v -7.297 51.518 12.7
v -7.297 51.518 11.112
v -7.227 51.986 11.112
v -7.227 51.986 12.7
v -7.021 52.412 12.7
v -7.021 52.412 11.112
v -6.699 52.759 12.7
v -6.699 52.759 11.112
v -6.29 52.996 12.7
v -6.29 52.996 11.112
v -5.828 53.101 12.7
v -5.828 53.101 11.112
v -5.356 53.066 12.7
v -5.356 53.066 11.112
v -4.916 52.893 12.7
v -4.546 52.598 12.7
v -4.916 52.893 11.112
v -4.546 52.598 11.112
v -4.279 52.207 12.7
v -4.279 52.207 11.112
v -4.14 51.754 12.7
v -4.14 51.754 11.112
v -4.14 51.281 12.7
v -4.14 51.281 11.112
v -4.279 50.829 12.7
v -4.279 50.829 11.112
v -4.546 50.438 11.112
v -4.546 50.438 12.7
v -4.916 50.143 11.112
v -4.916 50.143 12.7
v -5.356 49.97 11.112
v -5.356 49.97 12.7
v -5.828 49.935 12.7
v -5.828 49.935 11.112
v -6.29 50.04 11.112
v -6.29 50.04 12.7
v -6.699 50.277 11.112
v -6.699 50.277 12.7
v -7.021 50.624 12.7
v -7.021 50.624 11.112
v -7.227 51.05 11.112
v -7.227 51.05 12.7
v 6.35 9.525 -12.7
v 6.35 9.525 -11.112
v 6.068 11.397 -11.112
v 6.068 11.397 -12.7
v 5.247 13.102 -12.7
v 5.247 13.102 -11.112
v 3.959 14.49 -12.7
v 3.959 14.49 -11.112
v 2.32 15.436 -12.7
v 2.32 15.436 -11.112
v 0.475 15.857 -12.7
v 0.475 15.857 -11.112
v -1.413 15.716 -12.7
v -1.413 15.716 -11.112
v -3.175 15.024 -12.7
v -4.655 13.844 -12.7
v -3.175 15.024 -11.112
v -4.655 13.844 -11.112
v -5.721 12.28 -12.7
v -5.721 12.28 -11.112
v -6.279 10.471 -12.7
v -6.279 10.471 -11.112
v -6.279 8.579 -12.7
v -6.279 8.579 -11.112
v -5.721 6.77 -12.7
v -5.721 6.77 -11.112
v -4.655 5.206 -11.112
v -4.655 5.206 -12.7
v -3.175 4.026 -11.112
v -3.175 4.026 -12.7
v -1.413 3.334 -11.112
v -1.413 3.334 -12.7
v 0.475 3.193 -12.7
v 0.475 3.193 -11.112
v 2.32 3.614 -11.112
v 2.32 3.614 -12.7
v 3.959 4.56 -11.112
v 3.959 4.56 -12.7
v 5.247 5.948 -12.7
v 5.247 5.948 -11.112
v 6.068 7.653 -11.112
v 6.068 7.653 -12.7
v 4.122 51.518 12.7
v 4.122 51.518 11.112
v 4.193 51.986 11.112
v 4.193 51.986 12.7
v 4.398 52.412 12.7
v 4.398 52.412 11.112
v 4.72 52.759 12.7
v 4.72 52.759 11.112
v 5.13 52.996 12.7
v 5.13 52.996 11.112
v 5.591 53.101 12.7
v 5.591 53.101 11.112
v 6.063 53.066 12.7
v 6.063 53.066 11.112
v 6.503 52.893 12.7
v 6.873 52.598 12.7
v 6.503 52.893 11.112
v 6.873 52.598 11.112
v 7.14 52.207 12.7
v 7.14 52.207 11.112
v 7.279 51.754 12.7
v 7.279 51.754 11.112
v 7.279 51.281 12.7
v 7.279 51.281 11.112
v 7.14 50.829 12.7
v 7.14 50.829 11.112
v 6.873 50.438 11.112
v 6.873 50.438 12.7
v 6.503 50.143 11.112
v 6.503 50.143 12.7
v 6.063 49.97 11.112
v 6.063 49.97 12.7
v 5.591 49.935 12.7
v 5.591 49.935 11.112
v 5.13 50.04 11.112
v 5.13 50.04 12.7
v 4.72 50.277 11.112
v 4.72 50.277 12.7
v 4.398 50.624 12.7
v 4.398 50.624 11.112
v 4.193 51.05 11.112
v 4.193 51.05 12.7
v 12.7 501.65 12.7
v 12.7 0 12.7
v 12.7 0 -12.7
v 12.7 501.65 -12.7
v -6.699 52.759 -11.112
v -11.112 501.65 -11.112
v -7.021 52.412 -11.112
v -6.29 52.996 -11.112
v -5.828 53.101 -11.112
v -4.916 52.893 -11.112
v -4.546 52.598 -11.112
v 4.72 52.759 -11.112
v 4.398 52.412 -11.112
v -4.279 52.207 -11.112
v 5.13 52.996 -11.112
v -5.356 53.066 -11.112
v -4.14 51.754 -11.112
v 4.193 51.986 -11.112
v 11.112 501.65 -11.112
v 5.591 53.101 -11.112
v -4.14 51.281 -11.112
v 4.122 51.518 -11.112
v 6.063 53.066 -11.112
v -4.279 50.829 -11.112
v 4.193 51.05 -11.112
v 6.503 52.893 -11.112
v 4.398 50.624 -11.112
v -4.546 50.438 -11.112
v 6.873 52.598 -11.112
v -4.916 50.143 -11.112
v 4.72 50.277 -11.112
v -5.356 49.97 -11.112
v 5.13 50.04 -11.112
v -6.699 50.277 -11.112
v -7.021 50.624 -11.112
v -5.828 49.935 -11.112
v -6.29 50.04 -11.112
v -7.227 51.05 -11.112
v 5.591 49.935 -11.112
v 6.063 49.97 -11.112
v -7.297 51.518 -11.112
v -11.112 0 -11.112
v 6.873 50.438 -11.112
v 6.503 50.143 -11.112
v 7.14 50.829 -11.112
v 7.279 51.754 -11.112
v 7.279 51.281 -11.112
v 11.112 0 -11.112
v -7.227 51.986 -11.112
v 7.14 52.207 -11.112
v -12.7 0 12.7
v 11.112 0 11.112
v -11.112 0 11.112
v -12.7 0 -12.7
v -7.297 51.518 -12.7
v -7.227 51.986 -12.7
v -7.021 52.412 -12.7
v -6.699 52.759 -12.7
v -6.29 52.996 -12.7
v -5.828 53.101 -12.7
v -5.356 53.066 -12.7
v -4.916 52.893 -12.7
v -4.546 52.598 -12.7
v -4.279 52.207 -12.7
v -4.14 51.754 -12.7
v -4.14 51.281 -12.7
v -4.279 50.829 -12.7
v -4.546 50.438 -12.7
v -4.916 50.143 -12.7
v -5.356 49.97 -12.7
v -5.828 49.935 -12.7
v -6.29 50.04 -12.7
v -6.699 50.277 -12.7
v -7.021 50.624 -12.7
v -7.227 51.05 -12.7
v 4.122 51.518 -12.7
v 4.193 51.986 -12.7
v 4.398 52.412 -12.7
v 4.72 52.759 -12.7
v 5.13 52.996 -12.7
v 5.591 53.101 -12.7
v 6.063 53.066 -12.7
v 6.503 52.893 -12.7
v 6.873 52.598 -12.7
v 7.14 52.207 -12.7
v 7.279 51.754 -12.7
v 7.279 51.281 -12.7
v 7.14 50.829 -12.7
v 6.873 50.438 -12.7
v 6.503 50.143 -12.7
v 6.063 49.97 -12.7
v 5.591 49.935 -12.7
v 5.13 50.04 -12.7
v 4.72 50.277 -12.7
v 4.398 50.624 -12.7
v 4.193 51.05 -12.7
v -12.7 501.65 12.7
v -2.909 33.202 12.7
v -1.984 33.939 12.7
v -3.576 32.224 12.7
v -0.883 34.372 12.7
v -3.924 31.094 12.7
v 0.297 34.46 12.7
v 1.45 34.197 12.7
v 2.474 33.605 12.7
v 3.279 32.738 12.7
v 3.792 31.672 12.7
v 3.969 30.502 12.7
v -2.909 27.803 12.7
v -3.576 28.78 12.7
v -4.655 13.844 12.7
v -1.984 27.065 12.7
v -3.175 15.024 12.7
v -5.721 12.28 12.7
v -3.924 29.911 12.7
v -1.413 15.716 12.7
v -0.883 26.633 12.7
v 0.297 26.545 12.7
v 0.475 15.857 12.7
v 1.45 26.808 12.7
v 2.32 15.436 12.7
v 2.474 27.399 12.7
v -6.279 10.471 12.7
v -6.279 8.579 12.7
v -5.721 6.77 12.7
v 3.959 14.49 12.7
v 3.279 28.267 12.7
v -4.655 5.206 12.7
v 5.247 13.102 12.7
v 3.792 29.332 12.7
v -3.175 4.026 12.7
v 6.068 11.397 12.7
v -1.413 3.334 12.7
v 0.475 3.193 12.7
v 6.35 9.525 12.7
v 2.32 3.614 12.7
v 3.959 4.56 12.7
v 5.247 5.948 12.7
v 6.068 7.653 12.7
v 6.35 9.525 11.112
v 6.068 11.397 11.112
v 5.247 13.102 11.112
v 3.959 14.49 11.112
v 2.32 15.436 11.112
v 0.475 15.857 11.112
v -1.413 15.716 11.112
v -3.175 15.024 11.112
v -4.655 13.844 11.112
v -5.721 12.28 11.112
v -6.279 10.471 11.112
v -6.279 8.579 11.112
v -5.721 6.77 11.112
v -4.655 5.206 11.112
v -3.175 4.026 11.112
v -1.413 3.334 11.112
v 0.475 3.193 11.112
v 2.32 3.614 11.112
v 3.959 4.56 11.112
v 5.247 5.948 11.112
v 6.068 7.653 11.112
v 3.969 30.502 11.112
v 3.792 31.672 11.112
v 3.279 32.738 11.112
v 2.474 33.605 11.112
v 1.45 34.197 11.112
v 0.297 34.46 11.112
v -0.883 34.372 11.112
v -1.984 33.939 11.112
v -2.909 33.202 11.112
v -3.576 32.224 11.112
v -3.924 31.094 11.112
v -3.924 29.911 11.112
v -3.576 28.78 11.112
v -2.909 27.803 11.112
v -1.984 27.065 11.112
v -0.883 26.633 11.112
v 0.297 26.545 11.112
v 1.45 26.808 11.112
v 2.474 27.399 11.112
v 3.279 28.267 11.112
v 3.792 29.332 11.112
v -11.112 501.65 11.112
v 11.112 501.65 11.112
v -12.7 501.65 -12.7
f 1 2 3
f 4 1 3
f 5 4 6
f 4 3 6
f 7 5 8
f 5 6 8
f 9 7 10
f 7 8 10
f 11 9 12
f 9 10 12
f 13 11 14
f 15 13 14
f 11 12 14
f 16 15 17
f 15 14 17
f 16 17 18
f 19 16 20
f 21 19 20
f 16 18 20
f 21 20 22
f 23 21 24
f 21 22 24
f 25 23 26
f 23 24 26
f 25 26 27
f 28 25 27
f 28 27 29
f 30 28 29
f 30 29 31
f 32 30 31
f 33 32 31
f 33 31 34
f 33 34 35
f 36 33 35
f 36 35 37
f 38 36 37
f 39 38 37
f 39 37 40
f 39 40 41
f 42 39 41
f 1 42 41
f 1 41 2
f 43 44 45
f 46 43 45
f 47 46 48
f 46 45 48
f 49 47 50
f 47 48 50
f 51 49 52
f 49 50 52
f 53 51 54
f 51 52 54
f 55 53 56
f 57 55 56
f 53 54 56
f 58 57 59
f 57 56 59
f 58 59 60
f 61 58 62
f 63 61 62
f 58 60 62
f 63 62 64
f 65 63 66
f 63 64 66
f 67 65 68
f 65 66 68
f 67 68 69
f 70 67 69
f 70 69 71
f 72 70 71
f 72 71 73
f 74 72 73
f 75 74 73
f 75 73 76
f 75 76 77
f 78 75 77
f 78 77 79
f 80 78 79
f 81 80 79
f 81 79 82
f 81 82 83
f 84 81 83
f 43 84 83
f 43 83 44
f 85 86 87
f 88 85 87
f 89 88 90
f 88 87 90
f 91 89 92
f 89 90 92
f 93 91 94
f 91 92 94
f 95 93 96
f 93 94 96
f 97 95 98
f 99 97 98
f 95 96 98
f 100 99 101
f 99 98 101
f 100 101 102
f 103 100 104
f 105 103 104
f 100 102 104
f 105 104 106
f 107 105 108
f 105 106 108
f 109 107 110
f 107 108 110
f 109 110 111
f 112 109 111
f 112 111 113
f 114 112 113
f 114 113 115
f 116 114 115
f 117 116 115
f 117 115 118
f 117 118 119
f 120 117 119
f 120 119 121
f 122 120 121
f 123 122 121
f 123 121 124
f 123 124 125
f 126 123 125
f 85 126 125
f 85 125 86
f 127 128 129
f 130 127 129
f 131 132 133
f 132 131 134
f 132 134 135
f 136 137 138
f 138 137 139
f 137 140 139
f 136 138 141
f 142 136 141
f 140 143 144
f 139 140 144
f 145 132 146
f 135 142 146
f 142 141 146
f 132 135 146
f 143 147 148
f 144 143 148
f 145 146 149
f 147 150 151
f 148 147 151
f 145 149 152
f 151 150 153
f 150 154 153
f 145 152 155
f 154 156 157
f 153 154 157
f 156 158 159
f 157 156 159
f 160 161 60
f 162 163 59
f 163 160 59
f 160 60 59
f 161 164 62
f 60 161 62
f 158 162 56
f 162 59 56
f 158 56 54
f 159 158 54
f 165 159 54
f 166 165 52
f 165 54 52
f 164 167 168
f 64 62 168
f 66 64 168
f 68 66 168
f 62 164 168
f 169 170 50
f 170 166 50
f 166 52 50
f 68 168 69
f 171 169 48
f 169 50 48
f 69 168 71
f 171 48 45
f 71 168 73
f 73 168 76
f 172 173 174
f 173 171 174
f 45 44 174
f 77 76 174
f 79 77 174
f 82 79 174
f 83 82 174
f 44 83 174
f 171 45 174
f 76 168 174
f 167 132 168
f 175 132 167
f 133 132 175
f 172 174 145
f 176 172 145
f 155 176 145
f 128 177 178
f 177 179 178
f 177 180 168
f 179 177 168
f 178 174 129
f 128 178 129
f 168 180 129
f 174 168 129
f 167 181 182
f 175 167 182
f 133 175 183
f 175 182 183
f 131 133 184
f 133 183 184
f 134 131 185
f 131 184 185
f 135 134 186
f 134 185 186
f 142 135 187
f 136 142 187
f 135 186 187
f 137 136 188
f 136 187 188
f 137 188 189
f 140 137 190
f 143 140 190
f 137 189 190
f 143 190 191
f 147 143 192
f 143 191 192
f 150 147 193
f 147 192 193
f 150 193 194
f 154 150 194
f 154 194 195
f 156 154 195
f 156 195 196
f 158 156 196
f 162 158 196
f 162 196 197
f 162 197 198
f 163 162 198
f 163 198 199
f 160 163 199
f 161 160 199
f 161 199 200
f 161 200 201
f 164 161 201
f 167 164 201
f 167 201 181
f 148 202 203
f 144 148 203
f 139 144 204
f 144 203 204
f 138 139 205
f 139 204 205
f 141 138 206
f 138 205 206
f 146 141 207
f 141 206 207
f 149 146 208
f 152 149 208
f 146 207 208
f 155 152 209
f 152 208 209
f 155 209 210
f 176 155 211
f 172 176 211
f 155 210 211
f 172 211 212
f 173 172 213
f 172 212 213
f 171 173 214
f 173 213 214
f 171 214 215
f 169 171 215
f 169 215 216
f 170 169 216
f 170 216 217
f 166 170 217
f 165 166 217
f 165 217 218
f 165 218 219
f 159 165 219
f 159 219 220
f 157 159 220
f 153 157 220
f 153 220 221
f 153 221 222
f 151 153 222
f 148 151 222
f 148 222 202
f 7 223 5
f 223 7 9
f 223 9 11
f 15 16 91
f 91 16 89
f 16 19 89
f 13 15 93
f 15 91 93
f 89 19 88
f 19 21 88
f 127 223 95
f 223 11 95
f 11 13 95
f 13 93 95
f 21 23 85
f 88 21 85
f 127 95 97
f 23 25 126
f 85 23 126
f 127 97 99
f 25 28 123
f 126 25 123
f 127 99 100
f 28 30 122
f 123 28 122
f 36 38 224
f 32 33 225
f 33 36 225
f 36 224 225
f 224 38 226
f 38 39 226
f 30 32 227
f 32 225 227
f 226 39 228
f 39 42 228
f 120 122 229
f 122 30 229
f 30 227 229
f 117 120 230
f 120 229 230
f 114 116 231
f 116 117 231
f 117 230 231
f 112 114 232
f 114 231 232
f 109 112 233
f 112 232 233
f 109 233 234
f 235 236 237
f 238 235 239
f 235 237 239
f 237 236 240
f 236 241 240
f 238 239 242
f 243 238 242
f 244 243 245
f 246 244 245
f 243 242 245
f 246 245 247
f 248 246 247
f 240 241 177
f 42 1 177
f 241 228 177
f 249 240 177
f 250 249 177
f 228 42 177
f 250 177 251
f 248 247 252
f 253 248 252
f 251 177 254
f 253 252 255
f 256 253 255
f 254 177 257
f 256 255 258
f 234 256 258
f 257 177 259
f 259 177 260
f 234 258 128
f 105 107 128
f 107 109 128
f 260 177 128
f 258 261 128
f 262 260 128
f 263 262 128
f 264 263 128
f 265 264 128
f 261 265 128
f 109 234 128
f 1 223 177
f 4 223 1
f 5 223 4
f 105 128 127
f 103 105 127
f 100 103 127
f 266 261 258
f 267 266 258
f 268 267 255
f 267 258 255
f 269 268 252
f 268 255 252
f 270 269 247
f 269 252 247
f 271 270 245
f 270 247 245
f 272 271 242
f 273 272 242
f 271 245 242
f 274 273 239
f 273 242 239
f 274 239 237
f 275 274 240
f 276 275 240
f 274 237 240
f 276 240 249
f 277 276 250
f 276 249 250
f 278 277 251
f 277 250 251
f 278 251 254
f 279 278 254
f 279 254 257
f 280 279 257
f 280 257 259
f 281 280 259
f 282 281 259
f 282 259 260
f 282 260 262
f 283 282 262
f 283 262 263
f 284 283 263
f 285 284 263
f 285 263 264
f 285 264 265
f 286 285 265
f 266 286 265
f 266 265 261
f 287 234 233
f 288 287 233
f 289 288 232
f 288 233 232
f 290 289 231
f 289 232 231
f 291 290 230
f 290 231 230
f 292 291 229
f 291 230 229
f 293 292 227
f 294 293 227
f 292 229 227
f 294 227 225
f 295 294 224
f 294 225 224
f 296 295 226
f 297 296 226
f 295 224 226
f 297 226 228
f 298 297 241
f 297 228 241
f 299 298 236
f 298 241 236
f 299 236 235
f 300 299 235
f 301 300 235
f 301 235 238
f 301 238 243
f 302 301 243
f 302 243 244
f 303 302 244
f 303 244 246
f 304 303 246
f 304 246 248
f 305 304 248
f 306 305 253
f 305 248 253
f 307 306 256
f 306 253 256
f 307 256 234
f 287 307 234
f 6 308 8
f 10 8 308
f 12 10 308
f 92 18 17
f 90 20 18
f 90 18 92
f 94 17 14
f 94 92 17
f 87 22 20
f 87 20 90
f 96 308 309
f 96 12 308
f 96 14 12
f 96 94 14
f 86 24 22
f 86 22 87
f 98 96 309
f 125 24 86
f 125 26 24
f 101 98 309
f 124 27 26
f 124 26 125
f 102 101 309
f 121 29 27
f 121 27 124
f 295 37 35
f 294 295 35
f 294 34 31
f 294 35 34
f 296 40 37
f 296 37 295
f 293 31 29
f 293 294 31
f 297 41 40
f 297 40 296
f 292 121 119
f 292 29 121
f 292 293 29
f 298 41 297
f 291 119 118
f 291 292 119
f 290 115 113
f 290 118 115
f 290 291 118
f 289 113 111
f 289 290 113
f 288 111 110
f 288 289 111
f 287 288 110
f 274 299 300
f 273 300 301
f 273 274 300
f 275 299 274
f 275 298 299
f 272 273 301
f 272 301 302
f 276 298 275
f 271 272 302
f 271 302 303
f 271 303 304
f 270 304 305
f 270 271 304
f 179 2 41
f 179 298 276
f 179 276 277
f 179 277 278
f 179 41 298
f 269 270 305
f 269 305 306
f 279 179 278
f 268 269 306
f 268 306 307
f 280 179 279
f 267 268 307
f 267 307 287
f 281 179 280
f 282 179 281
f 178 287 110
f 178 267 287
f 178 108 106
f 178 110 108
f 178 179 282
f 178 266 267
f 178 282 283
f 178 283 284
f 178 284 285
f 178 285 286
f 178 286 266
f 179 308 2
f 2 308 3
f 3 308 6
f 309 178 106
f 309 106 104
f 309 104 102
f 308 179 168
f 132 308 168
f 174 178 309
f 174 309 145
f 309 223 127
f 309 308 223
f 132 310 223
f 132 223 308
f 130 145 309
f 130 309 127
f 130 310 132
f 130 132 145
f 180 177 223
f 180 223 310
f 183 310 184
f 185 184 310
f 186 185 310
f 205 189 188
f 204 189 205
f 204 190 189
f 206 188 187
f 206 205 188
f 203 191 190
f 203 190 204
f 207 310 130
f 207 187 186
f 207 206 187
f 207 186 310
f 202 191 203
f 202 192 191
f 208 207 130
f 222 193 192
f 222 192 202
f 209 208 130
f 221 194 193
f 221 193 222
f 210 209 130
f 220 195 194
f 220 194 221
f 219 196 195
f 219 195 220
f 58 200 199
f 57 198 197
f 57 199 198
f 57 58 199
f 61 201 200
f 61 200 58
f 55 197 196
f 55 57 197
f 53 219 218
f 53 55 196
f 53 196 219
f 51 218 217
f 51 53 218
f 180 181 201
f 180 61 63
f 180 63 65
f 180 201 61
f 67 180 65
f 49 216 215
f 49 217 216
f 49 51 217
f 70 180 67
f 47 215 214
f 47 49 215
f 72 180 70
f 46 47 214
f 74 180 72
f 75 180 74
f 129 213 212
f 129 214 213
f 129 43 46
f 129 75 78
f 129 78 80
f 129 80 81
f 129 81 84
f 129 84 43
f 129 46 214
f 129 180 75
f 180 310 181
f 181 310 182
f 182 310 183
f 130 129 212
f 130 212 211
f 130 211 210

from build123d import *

# Parameters (mm, degrees)
SKETCH1_W           = 25.4
SKETCH1_H           = 25.4
SKETCH1_W_2         = 22.225
SKETCH1_H_2         = 22.225
BOSS_EXTRUDE1_DEPTH = 501.65
SKETCH4_R           = 6.35
CUT_EXTRUDE1_DEPTH  = 26.4
SKETCH5_R           = 1.5875
CUT_EXTRUDE2_DEPTH  = 26.4
SKETCH7_R           = 3.96875
CUT_EXTRUDE3_DEPTH  = 1.5875


with BuildPart() as part:
    # Sketch1 → Boss-Extrude1 (new body)
    with BuildSketch(Plane(origin=(0, 0, 0), x_dir=(1, 0, 0), z_dir=(0, 1, 0))):
        Rectangle(SKETCH1_W, SKETCH1_H)
        Rectangle(SKETCH1_W_2, SKETCH1_H_2, mode=Mode.SUBTRACT)
    extrude(amount=BOSS_EXTRUDE1_DEPTH)

    # Sketch4 → Cut-Extrude1 (cut, through all)
    with BuildSketch(Plane.XY.offset(12.7)):
        with Locations((0, 9.525)):
            Circle(SKETCH4_R)
    extrude(amount=-CUT_EXTRUDE1_DEPTH, mode=Mode.SUBTRACT)

    # Sketch5 → Cut-Extrude2 (cut, through all)
    with BuildSketch(Plane(origin=(0, 0, -12.7), x_dir=(-1, 0, 0), z_dir=(0, 0, -1))):
        with Locations((-5.709637497, 51.517813992)):
            Circle(SKETCH5_R)
        with Locations((5.709637497, 51.517813992)):
            Circle(SKETCH5_R)
    extrude(amount=-CUT_EXTRUDE2_DEPTH, mode=Mode.SUBTRACT)

    # Sketch7 → Cut-Extrude3 (cut)
    with BuildSketch(Plane.XY.offset(12.7)):
        with Locations((0, 30.5023012)):
            Circle(SKETCH7_R)
    extrude(amount=-CUT_EXTRUDE3_DEPTH, mode=Mode.SUBTRACT)


solid = part.part
